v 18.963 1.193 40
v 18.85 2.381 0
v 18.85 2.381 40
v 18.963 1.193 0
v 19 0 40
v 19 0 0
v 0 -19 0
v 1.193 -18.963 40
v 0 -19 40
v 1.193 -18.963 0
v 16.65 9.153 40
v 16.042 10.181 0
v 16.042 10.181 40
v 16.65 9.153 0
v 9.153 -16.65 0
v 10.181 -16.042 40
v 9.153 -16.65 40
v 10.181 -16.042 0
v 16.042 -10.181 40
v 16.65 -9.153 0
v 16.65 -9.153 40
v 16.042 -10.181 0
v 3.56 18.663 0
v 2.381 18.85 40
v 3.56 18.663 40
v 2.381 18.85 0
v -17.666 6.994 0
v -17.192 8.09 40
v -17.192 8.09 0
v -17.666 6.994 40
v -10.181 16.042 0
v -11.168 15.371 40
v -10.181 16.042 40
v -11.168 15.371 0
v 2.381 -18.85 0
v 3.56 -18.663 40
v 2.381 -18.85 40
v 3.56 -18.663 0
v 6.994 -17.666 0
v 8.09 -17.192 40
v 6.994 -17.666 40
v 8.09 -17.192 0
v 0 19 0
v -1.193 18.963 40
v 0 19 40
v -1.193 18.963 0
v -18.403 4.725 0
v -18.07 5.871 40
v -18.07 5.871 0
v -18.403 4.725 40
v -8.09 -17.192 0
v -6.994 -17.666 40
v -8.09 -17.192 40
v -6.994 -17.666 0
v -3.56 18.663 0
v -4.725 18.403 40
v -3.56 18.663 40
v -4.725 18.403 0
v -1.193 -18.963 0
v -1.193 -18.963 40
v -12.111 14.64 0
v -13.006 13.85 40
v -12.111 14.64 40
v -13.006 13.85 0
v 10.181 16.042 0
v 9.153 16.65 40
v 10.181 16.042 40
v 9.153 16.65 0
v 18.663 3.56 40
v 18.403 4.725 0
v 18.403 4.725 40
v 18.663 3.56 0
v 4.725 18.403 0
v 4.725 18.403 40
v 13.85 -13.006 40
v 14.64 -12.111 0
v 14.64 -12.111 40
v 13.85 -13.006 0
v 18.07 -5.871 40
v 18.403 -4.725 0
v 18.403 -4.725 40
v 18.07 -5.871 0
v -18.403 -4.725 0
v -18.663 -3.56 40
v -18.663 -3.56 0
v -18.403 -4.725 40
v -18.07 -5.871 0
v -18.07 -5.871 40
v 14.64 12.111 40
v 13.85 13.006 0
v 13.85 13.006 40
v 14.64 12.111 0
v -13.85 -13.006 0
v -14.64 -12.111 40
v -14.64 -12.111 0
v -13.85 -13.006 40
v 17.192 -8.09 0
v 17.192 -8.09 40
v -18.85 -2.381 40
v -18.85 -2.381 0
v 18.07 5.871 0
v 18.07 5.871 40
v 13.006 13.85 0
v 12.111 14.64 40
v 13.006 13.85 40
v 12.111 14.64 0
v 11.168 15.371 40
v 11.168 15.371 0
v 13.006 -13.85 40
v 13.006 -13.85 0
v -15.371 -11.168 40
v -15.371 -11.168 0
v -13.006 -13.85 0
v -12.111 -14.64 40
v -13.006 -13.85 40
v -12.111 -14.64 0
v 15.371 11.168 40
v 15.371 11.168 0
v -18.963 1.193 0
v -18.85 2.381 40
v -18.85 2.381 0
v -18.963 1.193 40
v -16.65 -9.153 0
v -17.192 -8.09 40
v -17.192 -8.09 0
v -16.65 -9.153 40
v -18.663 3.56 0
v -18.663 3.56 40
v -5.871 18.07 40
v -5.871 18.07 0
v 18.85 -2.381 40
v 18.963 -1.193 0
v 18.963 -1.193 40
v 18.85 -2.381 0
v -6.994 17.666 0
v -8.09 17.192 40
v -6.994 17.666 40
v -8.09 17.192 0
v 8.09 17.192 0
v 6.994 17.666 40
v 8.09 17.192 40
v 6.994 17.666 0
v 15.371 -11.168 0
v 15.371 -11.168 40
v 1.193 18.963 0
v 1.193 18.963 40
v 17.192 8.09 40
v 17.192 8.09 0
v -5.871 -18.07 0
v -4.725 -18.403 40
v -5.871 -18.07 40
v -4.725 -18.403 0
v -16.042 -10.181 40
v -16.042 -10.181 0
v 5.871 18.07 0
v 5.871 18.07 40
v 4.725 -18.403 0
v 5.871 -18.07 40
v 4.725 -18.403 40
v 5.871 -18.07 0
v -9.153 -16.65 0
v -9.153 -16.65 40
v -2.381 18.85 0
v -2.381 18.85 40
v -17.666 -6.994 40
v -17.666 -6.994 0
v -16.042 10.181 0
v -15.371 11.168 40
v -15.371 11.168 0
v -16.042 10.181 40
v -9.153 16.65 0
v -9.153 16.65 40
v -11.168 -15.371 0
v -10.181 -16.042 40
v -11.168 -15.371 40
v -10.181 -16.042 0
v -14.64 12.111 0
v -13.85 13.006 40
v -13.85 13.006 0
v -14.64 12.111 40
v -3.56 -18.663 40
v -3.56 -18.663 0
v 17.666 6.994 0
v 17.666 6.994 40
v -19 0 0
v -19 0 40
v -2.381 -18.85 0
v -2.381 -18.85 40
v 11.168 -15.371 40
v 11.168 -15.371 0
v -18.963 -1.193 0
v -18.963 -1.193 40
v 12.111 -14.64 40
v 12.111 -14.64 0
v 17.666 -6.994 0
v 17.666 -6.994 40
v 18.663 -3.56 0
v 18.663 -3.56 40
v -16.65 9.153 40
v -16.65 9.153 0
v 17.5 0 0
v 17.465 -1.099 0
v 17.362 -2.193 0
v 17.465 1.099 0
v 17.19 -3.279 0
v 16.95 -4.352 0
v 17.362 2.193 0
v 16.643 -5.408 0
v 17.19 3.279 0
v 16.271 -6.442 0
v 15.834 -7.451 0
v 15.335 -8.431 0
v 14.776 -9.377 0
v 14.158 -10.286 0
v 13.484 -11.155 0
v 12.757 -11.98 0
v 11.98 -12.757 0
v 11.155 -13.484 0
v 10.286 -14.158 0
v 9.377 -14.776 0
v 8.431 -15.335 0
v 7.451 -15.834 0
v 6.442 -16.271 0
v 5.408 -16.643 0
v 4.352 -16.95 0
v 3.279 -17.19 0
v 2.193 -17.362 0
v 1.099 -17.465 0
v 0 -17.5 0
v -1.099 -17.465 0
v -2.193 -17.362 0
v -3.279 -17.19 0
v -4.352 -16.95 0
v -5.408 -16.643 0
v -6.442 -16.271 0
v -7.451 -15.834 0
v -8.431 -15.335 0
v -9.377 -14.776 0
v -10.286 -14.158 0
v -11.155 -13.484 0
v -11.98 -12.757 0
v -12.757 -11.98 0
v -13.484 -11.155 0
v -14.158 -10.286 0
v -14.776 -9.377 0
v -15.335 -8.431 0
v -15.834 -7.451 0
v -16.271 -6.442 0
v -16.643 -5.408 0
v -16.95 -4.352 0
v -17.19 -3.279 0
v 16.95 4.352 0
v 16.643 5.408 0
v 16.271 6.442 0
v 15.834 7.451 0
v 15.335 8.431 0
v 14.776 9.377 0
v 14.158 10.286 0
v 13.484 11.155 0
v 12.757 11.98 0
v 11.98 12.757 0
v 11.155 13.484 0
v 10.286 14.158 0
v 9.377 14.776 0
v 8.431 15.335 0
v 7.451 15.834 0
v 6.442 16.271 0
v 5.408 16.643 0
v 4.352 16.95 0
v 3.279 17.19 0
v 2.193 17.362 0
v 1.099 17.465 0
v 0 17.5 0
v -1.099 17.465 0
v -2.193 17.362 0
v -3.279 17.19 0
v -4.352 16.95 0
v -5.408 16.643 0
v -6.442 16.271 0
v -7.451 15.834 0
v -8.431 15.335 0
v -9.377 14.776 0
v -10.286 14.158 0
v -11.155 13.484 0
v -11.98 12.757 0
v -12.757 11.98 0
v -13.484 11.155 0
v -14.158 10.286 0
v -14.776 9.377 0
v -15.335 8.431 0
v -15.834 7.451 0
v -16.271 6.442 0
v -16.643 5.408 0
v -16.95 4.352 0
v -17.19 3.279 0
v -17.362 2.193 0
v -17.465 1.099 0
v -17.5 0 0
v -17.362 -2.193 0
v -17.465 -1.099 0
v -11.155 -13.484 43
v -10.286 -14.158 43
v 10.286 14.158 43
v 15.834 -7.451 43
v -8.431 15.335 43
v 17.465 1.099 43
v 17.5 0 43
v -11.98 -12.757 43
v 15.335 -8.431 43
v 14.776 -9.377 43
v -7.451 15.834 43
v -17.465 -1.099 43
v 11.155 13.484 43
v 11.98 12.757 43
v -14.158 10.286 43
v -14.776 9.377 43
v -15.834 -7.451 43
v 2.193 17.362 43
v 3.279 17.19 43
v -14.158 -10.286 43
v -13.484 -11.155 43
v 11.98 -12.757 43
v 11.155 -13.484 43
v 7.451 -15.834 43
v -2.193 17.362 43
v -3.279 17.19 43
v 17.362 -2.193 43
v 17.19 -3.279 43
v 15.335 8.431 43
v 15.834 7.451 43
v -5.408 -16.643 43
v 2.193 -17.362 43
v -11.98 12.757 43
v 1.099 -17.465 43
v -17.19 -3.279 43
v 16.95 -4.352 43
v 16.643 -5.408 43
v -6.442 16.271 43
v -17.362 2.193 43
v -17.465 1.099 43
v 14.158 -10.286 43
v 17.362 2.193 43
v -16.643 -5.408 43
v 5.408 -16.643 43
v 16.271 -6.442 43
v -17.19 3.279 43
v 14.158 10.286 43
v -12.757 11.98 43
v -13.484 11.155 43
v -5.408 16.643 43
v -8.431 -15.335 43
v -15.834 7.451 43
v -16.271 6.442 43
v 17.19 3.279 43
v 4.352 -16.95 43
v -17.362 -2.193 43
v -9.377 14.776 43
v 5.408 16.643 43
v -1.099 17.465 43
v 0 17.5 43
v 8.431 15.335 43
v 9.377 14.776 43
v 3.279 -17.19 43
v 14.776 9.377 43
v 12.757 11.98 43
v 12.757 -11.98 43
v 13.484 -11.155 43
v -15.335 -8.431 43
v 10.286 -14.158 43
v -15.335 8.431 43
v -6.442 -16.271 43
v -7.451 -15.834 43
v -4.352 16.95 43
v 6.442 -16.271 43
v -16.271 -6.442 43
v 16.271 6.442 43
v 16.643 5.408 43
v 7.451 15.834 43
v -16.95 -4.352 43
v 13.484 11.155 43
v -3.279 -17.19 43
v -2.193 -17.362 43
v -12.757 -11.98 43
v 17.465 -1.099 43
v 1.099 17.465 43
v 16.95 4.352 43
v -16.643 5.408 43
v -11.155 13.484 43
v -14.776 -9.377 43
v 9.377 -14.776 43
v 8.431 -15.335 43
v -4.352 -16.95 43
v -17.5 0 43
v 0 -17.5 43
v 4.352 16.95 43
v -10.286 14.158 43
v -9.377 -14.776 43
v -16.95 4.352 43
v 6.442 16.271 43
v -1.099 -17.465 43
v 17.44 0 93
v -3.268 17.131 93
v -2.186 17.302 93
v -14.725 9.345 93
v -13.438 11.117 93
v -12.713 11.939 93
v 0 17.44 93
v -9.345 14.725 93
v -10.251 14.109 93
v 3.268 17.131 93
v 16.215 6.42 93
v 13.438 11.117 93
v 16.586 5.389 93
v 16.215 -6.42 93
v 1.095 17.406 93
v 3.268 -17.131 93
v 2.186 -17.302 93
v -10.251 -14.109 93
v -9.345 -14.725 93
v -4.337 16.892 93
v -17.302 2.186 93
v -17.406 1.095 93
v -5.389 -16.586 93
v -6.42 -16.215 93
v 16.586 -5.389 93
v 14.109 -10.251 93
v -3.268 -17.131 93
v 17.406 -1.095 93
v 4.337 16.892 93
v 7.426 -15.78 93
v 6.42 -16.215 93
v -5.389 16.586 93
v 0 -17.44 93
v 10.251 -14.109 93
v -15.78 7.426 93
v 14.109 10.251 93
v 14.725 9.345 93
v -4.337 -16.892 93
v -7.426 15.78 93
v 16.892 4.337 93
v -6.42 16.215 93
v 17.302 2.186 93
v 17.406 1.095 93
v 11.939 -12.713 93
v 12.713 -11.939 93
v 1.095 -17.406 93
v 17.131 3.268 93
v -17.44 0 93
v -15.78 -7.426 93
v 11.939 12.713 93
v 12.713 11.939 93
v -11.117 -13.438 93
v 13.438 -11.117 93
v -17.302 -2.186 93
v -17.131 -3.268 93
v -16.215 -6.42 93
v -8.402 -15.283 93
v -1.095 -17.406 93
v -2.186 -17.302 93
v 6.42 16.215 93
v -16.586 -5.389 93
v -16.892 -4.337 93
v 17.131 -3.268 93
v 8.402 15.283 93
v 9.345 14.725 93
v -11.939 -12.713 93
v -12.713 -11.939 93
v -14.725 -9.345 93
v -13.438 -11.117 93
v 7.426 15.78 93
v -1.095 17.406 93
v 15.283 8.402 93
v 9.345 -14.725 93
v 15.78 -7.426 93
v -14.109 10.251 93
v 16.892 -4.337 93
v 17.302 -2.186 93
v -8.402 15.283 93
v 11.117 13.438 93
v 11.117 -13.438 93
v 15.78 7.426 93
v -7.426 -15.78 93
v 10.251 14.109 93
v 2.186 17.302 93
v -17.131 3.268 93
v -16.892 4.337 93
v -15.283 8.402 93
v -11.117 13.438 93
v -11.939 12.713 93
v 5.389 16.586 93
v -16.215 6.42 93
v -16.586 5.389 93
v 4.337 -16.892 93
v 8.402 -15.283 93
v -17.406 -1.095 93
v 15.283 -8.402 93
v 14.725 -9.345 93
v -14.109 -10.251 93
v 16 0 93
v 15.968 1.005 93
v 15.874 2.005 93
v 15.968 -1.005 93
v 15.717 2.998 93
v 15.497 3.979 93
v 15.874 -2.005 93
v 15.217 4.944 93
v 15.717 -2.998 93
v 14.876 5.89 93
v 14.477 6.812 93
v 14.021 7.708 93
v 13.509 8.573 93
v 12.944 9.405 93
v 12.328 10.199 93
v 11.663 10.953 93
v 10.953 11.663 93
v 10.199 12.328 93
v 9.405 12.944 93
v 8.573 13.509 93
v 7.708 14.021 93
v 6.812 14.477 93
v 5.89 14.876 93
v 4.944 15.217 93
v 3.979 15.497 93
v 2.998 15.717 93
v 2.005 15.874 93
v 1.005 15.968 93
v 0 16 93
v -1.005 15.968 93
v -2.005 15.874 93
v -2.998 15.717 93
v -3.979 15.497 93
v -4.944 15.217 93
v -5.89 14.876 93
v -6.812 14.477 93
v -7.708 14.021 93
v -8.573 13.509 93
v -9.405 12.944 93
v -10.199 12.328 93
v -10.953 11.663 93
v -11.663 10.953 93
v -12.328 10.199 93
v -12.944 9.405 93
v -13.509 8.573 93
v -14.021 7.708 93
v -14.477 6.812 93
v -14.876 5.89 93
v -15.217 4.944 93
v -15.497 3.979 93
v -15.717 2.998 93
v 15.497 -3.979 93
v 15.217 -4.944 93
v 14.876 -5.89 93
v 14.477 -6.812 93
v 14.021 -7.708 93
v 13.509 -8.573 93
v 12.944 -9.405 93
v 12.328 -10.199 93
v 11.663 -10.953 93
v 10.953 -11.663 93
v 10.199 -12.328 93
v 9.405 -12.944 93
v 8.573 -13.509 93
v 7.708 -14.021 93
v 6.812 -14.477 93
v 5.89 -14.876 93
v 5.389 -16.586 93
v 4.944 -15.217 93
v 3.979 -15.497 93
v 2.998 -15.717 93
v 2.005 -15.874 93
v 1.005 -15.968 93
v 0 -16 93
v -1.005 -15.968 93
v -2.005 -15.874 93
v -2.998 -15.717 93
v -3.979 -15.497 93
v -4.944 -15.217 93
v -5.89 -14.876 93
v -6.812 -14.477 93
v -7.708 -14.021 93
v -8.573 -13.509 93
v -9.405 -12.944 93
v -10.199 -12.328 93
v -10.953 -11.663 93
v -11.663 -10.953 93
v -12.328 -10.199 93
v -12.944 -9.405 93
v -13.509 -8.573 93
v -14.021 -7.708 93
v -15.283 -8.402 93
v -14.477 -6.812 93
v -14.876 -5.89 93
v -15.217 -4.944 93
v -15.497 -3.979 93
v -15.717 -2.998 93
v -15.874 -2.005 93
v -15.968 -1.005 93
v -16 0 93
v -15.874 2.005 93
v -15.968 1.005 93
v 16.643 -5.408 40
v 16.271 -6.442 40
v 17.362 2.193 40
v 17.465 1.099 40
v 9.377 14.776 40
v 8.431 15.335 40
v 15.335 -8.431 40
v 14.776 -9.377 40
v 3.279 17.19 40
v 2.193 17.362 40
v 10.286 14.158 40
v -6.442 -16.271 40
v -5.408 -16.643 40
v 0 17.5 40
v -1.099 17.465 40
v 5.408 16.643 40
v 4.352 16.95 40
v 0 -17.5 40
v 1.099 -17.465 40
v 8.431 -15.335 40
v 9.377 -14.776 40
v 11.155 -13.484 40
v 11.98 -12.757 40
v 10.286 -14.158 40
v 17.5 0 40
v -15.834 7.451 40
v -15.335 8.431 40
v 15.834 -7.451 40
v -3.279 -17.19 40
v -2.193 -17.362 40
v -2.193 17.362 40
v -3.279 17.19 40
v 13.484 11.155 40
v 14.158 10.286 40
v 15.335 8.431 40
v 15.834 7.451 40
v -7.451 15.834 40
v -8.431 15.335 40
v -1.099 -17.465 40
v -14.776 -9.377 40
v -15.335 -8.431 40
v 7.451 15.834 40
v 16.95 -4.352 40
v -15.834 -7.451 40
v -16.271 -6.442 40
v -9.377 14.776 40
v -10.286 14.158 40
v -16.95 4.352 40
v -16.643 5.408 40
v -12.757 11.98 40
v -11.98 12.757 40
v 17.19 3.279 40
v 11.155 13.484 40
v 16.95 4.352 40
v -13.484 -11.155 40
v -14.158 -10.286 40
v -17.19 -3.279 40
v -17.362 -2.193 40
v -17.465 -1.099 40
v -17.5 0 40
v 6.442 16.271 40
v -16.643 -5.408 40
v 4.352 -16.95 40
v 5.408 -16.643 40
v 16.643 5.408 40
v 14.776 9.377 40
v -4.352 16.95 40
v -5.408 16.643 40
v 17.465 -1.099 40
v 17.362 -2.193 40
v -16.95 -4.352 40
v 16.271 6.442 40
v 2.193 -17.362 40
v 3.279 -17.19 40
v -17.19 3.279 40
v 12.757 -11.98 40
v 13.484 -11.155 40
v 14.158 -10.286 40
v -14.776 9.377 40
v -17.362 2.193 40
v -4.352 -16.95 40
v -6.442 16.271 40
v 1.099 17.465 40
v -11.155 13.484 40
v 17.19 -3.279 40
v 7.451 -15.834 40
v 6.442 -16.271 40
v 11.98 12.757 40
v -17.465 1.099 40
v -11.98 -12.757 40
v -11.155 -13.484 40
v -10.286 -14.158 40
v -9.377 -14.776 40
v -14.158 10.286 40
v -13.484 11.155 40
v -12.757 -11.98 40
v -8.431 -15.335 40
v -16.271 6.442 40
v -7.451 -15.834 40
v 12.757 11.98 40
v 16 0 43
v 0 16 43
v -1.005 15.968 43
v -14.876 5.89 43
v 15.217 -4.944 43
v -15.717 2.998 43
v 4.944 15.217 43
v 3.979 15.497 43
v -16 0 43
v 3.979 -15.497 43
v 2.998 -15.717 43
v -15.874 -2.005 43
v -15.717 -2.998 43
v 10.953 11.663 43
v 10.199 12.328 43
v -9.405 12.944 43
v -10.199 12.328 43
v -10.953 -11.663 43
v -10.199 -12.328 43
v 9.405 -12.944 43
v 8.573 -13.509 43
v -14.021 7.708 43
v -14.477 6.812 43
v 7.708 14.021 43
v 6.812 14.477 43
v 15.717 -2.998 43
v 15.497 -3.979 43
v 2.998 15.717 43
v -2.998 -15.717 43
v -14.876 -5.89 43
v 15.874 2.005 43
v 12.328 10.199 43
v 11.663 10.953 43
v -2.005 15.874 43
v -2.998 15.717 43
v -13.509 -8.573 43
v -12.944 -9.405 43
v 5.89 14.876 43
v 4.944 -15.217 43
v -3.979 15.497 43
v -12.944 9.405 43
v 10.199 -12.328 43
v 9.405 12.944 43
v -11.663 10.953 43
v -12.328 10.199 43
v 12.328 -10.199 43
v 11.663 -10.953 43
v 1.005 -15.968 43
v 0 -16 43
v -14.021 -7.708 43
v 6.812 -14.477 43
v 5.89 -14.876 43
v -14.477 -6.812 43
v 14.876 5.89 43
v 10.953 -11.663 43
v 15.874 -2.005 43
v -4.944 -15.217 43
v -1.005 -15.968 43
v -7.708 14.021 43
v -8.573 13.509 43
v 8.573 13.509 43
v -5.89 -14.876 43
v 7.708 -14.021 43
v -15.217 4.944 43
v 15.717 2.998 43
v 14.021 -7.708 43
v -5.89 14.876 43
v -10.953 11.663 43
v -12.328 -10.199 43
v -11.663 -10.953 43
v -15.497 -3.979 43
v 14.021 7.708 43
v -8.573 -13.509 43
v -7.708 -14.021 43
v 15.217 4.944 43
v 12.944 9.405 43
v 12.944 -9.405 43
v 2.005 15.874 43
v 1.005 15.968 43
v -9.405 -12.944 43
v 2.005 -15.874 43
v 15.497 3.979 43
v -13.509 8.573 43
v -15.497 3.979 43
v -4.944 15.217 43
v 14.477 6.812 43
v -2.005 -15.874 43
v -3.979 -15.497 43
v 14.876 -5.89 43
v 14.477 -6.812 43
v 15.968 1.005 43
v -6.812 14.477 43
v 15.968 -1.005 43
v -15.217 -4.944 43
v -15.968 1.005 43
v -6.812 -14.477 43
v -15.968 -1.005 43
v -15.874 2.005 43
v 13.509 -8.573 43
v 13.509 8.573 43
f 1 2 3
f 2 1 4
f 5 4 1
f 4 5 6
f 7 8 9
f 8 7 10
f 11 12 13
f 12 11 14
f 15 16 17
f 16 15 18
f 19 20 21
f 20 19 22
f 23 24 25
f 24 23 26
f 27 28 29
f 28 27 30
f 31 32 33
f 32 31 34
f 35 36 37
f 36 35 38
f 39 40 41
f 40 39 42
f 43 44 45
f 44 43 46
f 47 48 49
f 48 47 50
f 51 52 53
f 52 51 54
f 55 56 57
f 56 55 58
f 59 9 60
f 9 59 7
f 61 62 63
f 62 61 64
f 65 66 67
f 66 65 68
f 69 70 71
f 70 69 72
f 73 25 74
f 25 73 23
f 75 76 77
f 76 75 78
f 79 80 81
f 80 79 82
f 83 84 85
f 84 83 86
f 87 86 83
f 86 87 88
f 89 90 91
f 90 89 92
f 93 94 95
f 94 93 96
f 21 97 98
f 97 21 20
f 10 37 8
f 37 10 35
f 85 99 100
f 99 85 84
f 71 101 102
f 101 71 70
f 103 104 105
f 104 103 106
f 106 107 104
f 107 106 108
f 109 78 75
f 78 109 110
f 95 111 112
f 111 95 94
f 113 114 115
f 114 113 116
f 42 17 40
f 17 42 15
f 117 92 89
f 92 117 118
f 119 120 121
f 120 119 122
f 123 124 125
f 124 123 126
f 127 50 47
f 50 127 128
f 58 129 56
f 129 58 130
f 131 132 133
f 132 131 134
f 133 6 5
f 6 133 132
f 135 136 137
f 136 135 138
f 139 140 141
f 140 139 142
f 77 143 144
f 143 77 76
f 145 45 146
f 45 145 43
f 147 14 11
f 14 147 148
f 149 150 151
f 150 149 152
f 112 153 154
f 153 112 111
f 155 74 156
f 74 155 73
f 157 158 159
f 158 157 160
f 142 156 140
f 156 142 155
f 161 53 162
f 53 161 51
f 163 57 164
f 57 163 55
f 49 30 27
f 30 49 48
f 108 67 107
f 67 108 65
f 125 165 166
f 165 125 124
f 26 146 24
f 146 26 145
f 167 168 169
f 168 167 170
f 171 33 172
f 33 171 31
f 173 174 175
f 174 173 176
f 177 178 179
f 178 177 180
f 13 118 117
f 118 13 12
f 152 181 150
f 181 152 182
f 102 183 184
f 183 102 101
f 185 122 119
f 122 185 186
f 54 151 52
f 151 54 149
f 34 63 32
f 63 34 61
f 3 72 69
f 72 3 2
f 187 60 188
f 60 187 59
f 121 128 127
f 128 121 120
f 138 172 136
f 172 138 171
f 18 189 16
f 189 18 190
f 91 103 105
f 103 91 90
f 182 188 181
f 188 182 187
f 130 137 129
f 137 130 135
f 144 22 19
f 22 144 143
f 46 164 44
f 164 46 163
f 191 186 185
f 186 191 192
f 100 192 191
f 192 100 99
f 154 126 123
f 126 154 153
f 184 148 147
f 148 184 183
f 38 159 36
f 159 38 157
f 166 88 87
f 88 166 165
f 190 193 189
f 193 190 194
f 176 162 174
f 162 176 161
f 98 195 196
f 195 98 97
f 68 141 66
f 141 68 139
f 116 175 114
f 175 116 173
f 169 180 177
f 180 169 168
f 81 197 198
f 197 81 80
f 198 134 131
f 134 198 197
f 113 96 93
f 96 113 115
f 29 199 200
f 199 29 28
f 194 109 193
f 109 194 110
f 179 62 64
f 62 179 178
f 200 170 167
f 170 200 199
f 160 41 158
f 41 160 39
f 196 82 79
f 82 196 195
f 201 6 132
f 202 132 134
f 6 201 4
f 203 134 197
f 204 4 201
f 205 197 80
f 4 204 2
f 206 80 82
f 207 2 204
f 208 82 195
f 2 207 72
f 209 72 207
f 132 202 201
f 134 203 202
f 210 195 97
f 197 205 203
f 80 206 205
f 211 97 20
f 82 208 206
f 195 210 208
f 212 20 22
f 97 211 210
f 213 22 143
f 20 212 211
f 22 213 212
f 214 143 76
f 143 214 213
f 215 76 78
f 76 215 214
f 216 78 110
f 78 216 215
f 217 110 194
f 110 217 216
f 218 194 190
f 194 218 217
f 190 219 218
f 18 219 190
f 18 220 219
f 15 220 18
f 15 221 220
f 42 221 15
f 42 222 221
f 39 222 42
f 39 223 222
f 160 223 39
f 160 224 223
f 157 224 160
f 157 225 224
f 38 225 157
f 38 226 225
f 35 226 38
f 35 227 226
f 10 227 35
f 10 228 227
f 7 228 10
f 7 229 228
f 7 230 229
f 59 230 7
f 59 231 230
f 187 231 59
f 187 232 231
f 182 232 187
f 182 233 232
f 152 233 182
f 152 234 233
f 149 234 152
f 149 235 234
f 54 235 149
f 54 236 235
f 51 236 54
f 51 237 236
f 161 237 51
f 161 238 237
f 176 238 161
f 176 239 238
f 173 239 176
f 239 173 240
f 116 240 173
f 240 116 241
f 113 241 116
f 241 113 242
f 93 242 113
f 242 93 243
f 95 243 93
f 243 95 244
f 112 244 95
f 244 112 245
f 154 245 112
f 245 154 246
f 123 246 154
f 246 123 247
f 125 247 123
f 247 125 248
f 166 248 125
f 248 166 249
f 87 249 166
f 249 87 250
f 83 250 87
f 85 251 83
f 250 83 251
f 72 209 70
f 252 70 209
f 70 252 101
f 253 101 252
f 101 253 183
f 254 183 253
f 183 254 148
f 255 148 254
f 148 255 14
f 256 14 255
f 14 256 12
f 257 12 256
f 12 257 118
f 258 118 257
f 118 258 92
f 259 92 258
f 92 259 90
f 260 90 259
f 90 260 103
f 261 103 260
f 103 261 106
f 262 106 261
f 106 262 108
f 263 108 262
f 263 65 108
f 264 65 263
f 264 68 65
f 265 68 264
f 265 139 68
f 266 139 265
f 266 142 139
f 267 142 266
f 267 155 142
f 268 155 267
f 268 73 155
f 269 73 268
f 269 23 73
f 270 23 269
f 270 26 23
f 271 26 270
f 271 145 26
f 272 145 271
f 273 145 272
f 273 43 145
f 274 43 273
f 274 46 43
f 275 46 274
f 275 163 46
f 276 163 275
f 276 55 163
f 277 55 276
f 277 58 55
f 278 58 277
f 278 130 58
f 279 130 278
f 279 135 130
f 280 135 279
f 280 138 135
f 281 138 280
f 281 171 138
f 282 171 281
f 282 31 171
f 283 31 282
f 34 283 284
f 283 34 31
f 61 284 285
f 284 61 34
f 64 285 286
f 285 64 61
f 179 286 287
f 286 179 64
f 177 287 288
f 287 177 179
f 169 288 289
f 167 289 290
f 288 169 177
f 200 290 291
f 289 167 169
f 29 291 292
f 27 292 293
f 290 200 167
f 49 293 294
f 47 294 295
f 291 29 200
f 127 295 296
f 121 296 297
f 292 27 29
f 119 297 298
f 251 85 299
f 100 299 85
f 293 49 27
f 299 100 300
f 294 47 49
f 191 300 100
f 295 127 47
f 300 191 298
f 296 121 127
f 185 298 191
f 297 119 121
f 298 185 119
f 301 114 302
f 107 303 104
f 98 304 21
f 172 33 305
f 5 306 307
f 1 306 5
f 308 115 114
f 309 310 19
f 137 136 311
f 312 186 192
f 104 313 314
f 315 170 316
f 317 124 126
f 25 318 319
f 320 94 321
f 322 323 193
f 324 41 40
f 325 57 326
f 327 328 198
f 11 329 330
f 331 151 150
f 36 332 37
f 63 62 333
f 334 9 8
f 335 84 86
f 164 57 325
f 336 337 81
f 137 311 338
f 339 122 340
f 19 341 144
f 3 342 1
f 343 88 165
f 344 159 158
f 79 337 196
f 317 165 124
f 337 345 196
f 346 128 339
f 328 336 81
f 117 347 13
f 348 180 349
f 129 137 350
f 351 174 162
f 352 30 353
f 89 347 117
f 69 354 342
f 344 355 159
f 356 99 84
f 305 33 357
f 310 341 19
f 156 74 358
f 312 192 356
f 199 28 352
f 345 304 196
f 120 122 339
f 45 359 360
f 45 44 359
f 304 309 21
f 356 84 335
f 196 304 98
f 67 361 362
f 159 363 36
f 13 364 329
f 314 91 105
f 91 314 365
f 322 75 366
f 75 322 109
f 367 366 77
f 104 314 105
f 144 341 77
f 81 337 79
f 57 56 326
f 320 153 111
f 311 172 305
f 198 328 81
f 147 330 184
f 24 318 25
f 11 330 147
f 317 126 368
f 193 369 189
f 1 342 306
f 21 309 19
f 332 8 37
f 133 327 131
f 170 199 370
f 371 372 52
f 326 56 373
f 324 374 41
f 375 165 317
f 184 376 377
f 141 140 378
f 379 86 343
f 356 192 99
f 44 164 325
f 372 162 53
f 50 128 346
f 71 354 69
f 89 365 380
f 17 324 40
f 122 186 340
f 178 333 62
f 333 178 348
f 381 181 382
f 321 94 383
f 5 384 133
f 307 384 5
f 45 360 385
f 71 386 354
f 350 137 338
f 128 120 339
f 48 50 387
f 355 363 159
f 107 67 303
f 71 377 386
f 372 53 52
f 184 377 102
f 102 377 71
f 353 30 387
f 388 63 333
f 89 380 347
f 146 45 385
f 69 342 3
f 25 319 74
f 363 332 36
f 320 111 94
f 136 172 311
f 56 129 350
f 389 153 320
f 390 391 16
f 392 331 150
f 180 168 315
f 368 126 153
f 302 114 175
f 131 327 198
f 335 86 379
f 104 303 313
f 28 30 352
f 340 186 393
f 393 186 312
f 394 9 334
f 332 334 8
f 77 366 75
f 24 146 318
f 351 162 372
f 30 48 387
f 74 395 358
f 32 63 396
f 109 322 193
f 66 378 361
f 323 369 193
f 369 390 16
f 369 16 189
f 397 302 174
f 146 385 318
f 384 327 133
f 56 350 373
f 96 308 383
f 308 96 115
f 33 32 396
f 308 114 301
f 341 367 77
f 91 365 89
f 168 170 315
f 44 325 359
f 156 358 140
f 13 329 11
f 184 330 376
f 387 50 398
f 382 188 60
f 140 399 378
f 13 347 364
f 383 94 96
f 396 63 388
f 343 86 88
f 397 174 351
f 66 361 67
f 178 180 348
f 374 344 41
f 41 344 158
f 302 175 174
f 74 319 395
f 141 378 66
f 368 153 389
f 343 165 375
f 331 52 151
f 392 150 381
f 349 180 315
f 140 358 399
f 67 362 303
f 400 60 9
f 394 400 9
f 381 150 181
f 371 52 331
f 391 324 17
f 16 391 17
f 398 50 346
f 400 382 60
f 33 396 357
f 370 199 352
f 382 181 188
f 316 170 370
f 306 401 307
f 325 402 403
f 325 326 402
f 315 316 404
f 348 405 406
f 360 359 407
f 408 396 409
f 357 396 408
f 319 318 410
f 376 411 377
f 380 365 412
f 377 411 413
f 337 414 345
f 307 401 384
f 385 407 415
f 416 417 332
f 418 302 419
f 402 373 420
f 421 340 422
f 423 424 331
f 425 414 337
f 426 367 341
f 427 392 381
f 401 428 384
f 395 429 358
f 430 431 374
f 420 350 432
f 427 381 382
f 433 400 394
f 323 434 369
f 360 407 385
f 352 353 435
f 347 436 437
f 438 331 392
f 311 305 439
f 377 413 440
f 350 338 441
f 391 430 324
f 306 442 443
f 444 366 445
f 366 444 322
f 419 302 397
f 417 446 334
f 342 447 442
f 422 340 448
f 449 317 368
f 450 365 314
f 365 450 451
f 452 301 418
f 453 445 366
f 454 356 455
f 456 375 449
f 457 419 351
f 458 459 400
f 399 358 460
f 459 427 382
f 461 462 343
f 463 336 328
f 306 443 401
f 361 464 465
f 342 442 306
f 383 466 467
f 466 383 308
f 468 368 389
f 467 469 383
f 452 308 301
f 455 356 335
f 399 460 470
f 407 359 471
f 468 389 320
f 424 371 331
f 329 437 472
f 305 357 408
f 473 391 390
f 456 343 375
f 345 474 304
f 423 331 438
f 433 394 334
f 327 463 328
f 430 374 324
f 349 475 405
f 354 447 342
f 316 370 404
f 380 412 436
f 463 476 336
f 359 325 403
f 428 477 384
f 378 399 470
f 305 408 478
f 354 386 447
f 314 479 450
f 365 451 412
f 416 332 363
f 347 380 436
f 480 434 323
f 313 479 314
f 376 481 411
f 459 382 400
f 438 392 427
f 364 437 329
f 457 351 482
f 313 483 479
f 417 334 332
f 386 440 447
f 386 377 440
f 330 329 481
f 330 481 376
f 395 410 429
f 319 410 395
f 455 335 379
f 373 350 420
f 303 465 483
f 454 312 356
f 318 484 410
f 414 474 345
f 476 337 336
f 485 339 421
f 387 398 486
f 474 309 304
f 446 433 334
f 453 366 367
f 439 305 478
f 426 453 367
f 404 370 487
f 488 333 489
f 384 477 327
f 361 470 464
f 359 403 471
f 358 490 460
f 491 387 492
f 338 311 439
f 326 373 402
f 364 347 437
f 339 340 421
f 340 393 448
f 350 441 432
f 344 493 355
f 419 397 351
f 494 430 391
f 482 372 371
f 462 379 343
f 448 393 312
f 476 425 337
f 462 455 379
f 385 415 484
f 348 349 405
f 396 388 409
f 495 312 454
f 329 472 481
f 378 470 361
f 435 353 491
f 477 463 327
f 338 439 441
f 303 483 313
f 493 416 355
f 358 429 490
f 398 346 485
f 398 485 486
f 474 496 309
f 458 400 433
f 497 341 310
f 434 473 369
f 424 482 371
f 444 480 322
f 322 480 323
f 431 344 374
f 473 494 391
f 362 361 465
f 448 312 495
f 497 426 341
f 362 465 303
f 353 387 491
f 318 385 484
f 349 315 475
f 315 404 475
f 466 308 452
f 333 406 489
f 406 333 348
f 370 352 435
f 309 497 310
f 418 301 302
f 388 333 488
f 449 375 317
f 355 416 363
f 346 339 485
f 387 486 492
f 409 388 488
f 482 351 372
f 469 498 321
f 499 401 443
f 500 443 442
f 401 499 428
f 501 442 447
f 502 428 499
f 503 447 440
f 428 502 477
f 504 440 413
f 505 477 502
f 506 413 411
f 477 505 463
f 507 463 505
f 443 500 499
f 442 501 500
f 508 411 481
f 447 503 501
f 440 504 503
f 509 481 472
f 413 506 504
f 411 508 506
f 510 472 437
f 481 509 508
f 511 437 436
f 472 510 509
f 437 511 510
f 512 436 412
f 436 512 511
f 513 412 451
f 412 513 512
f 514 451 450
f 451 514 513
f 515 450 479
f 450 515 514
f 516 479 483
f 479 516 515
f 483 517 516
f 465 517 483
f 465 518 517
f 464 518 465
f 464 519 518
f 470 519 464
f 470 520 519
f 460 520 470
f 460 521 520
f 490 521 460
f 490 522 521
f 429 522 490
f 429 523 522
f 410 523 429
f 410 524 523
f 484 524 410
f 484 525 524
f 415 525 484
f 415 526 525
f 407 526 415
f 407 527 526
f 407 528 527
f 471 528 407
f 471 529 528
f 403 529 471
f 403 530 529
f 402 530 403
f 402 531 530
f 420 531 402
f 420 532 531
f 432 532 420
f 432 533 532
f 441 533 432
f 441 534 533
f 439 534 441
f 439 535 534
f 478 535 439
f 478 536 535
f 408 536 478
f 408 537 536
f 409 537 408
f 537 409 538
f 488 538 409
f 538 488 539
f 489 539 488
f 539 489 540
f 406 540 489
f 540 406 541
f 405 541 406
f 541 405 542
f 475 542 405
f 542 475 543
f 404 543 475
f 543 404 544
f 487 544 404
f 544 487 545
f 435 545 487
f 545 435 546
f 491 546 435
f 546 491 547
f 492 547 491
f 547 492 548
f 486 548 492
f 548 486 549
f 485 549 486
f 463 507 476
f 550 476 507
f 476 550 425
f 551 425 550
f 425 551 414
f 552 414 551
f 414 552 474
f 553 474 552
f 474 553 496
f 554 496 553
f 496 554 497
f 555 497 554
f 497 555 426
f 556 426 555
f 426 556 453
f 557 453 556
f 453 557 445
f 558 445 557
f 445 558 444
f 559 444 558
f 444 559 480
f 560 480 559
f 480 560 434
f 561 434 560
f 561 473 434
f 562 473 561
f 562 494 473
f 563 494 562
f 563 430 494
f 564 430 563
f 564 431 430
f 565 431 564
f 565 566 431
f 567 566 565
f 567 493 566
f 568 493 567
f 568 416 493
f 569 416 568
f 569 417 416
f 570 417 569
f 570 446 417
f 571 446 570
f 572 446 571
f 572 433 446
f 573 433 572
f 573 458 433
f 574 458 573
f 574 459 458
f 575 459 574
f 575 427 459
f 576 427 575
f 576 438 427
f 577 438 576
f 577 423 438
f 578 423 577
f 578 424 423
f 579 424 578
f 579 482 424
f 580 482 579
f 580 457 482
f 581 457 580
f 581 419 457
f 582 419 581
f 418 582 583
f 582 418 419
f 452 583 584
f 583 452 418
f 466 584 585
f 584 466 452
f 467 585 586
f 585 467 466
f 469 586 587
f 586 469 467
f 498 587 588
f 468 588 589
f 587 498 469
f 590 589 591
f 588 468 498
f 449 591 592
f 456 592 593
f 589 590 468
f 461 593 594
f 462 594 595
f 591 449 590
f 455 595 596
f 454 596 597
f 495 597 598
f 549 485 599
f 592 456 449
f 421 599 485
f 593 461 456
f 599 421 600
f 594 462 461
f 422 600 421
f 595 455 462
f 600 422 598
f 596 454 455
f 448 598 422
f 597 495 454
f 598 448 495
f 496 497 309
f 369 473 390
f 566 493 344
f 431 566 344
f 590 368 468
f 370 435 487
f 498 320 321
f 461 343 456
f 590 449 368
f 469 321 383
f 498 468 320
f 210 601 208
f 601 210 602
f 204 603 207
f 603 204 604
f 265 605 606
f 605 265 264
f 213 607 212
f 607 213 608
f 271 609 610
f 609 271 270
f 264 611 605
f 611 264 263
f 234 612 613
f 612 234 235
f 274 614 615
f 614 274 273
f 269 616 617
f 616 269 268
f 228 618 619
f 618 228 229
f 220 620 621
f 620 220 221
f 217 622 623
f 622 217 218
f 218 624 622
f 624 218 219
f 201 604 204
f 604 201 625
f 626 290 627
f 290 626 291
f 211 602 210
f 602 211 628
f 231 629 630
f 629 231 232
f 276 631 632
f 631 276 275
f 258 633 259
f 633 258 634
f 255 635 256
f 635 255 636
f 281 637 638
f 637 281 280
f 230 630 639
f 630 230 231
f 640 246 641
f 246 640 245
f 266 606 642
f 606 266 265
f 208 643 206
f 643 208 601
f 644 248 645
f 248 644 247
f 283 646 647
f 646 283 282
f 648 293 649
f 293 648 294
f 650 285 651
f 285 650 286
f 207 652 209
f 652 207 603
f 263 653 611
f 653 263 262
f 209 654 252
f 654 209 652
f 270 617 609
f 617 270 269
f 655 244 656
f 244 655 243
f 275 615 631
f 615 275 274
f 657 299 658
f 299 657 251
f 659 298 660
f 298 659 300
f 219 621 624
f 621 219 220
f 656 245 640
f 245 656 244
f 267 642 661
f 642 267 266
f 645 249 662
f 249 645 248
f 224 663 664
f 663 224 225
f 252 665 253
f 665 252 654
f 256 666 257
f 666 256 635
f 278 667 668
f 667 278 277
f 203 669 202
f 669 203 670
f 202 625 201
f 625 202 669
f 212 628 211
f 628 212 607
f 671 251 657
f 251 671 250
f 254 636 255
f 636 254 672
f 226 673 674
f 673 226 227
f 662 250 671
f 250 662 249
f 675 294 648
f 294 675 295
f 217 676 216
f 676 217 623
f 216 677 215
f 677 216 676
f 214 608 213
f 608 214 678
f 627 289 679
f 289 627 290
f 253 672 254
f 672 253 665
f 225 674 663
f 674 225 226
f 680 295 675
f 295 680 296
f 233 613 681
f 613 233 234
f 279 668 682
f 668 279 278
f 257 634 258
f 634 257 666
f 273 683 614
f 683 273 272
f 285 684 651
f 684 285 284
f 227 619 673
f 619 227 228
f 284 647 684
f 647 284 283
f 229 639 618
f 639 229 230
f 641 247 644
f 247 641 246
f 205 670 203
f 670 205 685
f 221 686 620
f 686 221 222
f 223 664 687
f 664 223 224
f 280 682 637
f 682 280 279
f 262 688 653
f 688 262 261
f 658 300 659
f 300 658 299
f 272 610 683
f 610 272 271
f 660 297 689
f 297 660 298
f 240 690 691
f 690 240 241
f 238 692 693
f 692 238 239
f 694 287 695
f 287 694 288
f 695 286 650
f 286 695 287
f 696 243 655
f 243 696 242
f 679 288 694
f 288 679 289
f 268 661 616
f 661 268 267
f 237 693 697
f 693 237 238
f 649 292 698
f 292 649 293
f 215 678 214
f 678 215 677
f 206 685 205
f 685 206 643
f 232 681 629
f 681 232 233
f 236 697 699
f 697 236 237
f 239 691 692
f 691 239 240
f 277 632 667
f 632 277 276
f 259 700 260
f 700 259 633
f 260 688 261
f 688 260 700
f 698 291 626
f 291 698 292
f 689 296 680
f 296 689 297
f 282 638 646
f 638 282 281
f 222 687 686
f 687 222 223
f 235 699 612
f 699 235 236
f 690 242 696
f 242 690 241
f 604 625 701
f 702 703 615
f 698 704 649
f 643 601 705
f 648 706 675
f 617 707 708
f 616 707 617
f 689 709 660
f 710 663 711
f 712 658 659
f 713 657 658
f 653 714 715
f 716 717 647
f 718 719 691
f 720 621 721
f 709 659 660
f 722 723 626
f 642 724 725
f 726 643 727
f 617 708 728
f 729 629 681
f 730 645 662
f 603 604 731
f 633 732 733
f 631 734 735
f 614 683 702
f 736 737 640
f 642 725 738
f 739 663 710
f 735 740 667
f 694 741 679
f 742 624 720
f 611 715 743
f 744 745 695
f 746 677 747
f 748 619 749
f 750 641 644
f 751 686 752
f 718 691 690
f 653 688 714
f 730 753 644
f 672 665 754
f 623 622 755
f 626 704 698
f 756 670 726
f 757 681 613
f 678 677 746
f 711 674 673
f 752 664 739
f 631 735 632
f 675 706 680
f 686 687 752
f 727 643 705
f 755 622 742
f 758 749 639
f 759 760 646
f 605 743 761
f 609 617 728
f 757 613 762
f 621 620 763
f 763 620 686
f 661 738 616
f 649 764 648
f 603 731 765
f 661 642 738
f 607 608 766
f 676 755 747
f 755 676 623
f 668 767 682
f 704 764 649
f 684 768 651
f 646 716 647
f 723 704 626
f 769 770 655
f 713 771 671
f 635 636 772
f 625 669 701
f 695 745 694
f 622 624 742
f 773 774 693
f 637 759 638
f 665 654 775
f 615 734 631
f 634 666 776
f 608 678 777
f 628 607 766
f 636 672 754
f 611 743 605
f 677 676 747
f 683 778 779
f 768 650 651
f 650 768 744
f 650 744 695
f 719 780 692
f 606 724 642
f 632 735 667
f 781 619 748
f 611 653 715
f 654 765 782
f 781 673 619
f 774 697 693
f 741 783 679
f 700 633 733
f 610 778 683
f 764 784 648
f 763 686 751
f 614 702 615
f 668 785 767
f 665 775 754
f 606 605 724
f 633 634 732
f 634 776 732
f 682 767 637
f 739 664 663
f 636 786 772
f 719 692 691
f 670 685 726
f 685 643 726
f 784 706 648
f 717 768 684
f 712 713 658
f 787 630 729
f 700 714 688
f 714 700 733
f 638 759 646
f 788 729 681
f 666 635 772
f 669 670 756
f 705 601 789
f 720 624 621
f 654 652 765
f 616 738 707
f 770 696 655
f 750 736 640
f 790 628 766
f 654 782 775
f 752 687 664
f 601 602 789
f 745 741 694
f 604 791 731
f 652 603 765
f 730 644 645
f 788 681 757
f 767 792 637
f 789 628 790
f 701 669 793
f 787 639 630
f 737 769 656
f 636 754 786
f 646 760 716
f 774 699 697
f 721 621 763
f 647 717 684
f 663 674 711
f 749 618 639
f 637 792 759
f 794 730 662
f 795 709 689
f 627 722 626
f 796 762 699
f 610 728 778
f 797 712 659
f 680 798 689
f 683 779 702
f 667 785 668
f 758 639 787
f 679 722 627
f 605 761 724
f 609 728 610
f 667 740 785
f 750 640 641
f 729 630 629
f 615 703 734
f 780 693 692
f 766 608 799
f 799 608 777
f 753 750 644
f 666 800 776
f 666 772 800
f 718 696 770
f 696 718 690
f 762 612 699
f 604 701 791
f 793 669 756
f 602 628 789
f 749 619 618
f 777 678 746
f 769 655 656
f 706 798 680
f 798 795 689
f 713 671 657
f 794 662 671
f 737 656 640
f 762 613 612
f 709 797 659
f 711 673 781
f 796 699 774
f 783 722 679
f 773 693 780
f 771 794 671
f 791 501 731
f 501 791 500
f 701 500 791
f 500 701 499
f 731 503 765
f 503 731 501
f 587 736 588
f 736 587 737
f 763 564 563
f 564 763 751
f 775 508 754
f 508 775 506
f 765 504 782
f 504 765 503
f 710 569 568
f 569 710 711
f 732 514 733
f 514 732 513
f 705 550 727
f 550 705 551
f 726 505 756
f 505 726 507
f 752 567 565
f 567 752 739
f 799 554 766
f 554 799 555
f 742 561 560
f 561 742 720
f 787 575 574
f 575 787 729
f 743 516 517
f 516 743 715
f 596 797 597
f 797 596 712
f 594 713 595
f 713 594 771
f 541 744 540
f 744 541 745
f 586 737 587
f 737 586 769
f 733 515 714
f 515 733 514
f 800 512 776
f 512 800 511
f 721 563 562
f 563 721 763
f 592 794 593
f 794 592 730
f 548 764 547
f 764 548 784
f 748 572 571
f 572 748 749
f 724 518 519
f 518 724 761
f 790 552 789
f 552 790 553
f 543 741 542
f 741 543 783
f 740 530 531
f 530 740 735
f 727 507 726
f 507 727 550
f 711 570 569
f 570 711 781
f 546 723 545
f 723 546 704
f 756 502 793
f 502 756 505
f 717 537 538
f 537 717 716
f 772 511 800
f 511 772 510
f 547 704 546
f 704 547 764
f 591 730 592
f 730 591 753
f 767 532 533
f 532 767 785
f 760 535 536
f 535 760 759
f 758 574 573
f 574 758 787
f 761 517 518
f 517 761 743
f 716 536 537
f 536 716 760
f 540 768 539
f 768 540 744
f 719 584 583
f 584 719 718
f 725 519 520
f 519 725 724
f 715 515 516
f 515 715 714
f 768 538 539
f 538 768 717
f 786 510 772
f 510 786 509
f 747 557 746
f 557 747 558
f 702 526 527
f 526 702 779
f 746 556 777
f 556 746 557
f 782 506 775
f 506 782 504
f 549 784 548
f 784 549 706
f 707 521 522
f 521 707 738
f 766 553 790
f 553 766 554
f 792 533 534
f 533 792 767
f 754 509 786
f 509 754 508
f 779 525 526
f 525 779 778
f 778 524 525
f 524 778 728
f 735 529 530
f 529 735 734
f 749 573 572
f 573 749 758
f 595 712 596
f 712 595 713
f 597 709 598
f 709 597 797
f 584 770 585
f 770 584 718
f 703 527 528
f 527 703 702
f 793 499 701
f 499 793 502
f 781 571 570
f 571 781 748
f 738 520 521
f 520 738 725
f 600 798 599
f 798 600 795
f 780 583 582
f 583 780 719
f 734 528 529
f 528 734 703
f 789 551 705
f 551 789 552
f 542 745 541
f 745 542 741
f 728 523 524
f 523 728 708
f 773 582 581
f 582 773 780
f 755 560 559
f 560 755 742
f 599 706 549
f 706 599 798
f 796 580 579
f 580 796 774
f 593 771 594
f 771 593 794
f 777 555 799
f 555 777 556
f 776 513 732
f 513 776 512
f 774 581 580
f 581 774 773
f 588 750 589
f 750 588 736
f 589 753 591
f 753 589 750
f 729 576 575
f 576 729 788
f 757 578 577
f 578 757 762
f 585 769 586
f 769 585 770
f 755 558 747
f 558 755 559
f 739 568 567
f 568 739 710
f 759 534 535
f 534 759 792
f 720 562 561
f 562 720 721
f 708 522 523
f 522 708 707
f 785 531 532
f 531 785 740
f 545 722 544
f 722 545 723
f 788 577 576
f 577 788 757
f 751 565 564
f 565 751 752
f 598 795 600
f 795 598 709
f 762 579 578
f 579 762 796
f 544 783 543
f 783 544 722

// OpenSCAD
/* [Universal Pipe Adapter] */

// this thing is published by teinturman
/* [PIPE 1] */
InternalDiameter1=35;
ExternalDiameter1=38;
Height1= 40; 

//Percentage of External Bevel
PercentExtBevel1=0;//[0:5:90]

//Percentage of Internal Bevel
PercentIntBevel1=0;//[0:5:90]


/* [PIPE 2] */
InternalDiameter2=32;
ExternalDiameter2=35;
Height2= 50;

//Percentage of External Bevel
PercentExtBevel2=4;//[0:5:90]

//Percentage of Internal Bevel
PercentIntBevel2=0;//[0:5:90]




/* [Hidden] */
InternalDiff=abs(InternalDiameter2-InternalDiameter1);
ExternalDiff=abs(ExternalDiameter2-ExternalDiameter1);
Hdiff=max(ExternalDiff,InternalDiff);

adapter(InternalDiameter1,ExternalDiameter1,InternalDiameter2,ExternalDiameter2,Hdiff);





module adapter(Int1,Ext1,Int2,Ext2,Hdiff)
{
$fn=100;
difference()
{
union()
  {  
    cylinder(r1=(Ext1/2)-(PercentExtBevel1*((Ext1-Int1)/2)/100),r2=Ext1/2,h=Height1);
    translate([0,0,Height1]) cylinder(r1=Ext1/2,r2=Ext2/2,h=Hdiff);
    translate([0,0,Height1+Hdiff])cylinder(r1=Ext2/2,r2=(Ext2/2)-PercentExtBevel2*((Ext2-Int2)/2)/100,h=Height2);
  }

    cylinder(r1=(Int1/2)+PercentIntBevel1*((ExternalDiameter1-InternalDiameter1)/2)/100,r2=(Int1/2),h=Height1);
    translate([0,0,Height1])cylinder(r1=Int1/2,r2=Int2/2,h=Hdiff);
    translate([0,0,Height1+Hdiff]) cylinder(r1=Int2/2,r2=(Int2/2)+PercentIntBevel2*((ExternalDiameter2-InternalDiameter2)/2)/100, h=Height2);

}

}
